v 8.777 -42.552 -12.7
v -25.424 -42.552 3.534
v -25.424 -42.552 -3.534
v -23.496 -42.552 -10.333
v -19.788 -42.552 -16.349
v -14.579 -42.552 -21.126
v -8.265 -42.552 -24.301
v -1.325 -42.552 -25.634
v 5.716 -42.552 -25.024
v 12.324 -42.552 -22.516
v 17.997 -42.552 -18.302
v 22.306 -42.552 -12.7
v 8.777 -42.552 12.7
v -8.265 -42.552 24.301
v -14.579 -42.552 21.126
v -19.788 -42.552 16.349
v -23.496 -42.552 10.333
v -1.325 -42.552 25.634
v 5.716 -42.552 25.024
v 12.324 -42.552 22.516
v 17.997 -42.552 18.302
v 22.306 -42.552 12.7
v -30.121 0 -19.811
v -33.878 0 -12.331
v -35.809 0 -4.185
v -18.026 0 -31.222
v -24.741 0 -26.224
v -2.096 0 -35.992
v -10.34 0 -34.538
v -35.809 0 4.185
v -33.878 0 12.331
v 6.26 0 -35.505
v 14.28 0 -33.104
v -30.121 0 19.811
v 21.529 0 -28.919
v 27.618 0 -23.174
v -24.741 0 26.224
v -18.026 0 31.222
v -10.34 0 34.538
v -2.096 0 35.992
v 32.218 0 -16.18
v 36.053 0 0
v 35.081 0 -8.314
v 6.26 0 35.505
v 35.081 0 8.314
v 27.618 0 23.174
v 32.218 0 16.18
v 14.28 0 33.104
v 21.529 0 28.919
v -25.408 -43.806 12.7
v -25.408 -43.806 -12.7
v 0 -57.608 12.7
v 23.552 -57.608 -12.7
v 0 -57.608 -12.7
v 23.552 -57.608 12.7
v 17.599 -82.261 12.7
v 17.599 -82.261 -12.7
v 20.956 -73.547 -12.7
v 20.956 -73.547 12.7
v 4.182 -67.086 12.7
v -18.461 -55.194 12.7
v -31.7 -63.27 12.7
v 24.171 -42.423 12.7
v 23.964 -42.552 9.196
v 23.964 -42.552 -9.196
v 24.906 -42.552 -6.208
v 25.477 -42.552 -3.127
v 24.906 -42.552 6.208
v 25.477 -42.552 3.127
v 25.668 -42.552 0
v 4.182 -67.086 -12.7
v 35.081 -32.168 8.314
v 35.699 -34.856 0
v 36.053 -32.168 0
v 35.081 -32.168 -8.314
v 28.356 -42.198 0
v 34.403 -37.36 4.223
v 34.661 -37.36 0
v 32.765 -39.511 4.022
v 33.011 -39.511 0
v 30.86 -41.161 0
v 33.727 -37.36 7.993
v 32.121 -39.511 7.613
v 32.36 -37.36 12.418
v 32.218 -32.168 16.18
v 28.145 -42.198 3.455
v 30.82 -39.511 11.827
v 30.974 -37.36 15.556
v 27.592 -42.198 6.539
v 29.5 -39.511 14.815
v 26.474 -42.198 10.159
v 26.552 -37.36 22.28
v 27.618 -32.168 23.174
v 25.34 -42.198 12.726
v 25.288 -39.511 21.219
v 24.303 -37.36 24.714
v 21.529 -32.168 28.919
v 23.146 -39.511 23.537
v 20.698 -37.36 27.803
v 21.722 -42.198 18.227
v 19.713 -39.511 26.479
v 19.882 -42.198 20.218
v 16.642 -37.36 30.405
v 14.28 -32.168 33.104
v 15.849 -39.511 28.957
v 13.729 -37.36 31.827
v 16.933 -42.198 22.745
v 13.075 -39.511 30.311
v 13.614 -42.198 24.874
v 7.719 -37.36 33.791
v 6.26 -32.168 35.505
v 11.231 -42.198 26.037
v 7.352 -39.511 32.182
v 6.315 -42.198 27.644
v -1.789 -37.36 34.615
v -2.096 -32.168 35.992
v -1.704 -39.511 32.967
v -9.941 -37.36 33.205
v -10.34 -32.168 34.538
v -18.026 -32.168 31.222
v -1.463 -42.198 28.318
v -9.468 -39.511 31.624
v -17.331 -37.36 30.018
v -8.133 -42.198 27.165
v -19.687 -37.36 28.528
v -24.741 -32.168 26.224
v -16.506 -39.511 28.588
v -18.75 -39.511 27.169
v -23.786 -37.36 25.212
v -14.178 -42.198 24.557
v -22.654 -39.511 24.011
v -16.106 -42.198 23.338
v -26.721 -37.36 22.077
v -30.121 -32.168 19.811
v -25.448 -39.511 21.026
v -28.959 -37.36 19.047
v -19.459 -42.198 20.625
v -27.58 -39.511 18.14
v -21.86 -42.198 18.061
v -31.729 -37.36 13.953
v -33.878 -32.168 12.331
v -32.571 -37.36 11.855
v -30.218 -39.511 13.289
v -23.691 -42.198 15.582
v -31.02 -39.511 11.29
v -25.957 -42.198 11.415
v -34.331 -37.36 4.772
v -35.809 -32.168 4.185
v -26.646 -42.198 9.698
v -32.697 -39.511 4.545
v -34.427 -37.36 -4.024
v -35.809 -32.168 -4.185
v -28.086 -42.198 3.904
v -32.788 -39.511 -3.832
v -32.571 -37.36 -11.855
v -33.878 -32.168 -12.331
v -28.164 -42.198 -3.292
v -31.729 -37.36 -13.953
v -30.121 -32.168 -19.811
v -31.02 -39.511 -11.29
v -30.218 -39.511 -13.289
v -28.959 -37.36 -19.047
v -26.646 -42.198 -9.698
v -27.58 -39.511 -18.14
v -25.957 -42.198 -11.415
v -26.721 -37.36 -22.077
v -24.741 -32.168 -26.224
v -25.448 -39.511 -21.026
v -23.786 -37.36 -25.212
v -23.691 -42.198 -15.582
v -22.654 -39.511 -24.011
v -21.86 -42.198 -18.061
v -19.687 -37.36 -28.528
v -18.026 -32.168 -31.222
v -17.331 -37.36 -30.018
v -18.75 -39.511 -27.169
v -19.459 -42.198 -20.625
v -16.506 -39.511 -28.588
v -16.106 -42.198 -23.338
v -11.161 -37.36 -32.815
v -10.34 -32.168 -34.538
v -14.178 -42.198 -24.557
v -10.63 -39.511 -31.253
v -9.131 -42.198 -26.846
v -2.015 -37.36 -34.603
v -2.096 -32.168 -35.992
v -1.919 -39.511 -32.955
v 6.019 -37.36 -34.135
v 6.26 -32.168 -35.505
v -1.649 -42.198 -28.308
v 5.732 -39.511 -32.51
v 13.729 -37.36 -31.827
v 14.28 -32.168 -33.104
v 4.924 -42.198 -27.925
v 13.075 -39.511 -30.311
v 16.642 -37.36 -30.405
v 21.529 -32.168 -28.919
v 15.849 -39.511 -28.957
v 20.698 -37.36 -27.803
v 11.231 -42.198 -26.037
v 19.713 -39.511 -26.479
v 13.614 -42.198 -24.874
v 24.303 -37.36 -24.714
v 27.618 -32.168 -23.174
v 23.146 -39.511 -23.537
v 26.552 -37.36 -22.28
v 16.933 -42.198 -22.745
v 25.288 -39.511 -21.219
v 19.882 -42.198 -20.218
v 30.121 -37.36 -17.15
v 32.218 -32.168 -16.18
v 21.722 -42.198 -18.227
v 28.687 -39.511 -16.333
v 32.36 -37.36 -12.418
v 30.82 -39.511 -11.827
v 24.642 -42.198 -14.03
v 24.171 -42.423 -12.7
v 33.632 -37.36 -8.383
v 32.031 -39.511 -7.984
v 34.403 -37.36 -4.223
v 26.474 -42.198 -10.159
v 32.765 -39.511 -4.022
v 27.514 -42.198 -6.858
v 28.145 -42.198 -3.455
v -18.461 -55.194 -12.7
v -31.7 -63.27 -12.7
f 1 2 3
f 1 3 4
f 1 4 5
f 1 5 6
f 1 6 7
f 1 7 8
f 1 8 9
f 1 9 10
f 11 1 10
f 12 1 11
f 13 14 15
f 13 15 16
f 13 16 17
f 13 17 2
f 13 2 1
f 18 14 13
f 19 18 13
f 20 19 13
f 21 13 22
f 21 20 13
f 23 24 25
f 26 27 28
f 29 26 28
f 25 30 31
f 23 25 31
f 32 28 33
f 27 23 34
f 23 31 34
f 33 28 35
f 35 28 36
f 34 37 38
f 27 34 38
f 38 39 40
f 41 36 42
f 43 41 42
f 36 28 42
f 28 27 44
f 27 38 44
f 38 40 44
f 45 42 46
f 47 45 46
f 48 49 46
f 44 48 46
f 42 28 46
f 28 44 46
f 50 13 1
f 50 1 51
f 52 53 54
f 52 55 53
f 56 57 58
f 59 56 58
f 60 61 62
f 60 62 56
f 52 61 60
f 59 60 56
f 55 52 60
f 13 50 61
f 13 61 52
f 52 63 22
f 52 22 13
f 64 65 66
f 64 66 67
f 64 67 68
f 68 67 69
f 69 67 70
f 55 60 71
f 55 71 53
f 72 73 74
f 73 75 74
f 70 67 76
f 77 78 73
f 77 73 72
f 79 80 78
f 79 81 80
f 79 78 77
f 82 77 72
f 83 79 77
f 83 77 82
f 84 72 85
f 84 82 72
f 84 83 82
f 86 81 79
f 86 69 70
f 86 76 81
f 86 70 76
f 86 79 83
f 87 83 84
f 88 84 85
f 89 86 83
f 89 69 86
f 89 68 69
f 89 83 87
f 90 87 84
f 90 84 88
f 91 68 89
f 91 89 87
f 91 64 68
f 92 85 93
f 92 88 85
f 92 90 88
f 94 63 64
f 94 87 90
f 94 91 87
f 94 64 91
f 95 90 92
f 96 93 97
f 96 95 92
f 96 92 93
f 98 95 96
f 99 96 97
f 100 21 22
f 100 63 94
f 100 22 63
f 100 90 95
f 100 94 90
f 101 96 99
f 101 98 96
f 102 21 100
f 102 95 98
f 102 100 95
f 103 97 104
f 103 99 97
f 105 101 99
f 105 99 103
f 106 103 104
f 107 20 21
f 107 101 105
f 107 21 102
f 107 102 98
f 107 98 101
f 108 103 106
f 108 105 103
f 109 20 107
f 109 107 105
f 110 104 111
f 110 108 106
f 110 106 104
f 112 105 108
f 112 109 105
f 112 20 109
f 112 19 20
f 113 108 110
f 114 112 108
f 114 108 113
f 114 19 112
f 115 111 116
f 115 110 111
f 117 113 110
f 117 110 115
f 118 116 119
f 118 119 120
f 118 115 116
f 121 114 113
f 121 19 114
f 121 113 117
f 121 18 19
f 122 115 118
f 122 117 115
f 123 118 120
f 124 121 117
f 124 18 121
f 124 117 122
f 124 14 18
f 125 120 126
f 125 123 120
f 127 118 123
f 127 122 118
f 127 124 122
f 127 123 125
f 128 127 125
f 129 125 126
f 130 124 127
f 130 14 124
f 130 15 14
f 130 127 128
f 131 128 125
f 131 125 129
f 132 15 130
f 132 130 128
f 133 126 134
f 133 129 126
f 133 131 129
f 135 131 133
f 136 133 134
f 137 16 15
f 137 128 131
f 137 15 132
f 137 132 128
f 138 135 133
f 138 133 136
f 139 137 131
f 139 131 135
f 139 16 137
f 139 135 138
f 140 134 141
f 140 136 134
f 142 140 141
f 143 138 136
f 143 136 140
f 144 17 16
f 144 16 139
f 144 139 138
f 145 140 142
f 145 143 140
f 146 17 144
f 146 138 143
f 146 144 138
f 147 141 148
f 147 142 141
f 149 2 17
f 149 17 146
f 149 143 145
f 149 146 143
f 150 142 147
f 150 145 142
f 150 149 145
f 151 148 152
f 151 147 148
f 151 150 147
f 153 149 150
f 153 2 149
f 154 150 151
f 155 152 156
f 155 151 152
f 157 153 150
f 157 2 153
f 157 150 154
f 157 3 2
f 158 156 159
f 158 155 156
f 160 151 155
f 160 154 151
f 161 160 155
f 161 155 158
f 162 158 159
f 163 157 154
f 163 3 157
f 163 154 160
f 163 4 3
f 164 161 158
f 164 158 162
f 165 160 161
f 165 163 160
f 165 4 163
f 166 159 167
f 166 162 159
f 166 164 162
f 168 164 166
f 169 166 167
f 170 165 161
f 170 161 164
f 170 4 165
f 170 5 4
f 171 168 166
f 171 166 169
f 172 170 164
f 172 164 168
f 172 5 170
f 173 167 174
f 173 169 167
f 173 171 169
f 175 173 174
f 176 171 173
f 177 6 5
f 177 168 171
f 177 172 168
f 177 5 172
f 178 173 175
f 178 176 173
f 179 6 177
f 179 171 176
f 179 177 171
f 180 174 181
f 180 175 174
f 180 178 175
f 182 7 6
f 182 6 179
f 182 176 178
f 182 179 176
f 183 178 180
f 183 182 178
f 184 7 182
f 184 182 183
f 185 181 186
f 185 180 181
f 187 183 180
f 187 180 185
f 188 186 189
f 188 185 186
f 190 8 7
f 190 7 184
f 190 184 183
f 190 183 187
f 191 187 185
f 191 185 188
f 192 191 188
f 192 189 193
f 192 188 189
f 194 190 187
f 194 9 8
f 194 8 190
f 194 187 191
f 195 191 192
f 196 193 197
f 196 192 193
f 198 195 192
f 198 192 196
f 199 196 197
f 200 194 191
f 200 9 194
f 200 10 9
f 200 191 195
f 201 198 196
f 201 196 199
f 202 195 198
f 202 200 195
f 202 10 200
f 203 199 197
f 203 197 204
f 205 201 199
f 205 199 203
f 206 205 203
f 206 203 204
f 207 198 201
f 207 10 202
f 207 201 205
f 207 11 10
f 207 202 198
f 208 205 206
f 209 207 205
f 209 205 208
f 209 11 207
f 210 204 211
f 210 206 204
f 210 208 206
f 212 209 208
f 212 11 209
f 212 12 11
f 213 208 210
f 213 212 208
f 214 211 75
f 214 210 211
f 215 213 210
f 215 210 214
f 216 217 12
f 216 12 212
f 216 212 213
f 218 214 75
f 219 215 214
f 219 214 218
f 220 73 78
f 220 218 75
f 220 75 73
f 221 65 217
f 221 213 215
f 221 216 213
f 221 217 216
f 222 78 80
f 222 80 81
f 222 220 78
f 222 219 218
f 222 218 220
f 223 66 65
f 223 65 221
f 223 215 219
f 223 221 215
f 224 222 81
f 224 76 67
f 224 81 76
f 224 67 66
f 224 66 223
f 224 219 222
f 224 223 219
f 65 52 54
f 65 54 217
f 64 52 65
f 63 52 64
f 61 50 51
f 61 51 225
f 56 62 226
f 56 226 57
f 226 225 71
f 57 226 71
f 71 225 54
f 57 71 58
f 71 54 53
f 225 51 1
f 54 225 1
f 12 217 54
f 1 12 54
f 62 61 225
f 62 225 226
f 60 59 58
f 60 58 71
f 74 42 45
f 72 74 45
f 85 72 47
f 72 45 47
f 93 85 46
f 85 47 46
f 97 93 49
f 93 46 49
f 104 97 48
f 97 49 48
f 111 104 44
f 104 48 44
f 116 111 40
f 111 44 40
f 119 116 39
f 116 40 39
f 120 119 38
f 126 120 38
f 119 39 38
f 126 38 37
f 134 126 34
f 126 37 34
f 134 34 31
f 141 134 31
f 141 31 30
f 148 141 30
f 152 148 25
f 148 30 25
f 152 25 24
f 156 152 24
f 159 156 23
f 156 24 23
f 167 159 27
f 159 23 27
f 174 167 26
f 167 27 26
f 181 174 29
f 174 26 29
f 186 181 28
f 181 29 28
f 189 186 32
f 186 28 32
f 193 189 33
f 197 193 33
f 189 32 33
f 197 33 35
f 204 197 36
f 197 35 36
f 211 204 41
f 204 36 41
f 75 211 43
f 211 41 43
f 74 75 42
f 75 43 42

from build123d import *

# Parameters (mm, degrees)
F0_R     = 36.052537
F1_DEPTH = 42.5522
F2_R     = 10.384305
F4_DEPTH = 12.7


with BuildPart() as f1:
    # F0 (on Front) → F1 (new body)
    with BuildSketch(Plane.XZ):
        Circle(F0_R)
    extrude(amount=F1_DEPTH)

    # F2
    f2_edges = [f1.edges().sort_by_distance(p)[0] for p in [
        (-36.052537, -42.5522, 0),
    ]]
    fillet(f2_edges, radius=F2_R)

    # F3 (on Top) → F4 (join, symmetric)
    with BuildSketch(Plane.XY):
        Polygon((24.906132, -41.96053), (-25.40835, -43.80627), (-18.461386, -55.194348), (-31.700424, -63.270436), (17.599434, -82.260892), (20.955874, -73.547461), (4.182442, -67.086284), (23.552079, -57.608064), (0, -57.608064), align=None)
    extrude(amount=F4_DEPTH, both=True)


solid = f1.part
